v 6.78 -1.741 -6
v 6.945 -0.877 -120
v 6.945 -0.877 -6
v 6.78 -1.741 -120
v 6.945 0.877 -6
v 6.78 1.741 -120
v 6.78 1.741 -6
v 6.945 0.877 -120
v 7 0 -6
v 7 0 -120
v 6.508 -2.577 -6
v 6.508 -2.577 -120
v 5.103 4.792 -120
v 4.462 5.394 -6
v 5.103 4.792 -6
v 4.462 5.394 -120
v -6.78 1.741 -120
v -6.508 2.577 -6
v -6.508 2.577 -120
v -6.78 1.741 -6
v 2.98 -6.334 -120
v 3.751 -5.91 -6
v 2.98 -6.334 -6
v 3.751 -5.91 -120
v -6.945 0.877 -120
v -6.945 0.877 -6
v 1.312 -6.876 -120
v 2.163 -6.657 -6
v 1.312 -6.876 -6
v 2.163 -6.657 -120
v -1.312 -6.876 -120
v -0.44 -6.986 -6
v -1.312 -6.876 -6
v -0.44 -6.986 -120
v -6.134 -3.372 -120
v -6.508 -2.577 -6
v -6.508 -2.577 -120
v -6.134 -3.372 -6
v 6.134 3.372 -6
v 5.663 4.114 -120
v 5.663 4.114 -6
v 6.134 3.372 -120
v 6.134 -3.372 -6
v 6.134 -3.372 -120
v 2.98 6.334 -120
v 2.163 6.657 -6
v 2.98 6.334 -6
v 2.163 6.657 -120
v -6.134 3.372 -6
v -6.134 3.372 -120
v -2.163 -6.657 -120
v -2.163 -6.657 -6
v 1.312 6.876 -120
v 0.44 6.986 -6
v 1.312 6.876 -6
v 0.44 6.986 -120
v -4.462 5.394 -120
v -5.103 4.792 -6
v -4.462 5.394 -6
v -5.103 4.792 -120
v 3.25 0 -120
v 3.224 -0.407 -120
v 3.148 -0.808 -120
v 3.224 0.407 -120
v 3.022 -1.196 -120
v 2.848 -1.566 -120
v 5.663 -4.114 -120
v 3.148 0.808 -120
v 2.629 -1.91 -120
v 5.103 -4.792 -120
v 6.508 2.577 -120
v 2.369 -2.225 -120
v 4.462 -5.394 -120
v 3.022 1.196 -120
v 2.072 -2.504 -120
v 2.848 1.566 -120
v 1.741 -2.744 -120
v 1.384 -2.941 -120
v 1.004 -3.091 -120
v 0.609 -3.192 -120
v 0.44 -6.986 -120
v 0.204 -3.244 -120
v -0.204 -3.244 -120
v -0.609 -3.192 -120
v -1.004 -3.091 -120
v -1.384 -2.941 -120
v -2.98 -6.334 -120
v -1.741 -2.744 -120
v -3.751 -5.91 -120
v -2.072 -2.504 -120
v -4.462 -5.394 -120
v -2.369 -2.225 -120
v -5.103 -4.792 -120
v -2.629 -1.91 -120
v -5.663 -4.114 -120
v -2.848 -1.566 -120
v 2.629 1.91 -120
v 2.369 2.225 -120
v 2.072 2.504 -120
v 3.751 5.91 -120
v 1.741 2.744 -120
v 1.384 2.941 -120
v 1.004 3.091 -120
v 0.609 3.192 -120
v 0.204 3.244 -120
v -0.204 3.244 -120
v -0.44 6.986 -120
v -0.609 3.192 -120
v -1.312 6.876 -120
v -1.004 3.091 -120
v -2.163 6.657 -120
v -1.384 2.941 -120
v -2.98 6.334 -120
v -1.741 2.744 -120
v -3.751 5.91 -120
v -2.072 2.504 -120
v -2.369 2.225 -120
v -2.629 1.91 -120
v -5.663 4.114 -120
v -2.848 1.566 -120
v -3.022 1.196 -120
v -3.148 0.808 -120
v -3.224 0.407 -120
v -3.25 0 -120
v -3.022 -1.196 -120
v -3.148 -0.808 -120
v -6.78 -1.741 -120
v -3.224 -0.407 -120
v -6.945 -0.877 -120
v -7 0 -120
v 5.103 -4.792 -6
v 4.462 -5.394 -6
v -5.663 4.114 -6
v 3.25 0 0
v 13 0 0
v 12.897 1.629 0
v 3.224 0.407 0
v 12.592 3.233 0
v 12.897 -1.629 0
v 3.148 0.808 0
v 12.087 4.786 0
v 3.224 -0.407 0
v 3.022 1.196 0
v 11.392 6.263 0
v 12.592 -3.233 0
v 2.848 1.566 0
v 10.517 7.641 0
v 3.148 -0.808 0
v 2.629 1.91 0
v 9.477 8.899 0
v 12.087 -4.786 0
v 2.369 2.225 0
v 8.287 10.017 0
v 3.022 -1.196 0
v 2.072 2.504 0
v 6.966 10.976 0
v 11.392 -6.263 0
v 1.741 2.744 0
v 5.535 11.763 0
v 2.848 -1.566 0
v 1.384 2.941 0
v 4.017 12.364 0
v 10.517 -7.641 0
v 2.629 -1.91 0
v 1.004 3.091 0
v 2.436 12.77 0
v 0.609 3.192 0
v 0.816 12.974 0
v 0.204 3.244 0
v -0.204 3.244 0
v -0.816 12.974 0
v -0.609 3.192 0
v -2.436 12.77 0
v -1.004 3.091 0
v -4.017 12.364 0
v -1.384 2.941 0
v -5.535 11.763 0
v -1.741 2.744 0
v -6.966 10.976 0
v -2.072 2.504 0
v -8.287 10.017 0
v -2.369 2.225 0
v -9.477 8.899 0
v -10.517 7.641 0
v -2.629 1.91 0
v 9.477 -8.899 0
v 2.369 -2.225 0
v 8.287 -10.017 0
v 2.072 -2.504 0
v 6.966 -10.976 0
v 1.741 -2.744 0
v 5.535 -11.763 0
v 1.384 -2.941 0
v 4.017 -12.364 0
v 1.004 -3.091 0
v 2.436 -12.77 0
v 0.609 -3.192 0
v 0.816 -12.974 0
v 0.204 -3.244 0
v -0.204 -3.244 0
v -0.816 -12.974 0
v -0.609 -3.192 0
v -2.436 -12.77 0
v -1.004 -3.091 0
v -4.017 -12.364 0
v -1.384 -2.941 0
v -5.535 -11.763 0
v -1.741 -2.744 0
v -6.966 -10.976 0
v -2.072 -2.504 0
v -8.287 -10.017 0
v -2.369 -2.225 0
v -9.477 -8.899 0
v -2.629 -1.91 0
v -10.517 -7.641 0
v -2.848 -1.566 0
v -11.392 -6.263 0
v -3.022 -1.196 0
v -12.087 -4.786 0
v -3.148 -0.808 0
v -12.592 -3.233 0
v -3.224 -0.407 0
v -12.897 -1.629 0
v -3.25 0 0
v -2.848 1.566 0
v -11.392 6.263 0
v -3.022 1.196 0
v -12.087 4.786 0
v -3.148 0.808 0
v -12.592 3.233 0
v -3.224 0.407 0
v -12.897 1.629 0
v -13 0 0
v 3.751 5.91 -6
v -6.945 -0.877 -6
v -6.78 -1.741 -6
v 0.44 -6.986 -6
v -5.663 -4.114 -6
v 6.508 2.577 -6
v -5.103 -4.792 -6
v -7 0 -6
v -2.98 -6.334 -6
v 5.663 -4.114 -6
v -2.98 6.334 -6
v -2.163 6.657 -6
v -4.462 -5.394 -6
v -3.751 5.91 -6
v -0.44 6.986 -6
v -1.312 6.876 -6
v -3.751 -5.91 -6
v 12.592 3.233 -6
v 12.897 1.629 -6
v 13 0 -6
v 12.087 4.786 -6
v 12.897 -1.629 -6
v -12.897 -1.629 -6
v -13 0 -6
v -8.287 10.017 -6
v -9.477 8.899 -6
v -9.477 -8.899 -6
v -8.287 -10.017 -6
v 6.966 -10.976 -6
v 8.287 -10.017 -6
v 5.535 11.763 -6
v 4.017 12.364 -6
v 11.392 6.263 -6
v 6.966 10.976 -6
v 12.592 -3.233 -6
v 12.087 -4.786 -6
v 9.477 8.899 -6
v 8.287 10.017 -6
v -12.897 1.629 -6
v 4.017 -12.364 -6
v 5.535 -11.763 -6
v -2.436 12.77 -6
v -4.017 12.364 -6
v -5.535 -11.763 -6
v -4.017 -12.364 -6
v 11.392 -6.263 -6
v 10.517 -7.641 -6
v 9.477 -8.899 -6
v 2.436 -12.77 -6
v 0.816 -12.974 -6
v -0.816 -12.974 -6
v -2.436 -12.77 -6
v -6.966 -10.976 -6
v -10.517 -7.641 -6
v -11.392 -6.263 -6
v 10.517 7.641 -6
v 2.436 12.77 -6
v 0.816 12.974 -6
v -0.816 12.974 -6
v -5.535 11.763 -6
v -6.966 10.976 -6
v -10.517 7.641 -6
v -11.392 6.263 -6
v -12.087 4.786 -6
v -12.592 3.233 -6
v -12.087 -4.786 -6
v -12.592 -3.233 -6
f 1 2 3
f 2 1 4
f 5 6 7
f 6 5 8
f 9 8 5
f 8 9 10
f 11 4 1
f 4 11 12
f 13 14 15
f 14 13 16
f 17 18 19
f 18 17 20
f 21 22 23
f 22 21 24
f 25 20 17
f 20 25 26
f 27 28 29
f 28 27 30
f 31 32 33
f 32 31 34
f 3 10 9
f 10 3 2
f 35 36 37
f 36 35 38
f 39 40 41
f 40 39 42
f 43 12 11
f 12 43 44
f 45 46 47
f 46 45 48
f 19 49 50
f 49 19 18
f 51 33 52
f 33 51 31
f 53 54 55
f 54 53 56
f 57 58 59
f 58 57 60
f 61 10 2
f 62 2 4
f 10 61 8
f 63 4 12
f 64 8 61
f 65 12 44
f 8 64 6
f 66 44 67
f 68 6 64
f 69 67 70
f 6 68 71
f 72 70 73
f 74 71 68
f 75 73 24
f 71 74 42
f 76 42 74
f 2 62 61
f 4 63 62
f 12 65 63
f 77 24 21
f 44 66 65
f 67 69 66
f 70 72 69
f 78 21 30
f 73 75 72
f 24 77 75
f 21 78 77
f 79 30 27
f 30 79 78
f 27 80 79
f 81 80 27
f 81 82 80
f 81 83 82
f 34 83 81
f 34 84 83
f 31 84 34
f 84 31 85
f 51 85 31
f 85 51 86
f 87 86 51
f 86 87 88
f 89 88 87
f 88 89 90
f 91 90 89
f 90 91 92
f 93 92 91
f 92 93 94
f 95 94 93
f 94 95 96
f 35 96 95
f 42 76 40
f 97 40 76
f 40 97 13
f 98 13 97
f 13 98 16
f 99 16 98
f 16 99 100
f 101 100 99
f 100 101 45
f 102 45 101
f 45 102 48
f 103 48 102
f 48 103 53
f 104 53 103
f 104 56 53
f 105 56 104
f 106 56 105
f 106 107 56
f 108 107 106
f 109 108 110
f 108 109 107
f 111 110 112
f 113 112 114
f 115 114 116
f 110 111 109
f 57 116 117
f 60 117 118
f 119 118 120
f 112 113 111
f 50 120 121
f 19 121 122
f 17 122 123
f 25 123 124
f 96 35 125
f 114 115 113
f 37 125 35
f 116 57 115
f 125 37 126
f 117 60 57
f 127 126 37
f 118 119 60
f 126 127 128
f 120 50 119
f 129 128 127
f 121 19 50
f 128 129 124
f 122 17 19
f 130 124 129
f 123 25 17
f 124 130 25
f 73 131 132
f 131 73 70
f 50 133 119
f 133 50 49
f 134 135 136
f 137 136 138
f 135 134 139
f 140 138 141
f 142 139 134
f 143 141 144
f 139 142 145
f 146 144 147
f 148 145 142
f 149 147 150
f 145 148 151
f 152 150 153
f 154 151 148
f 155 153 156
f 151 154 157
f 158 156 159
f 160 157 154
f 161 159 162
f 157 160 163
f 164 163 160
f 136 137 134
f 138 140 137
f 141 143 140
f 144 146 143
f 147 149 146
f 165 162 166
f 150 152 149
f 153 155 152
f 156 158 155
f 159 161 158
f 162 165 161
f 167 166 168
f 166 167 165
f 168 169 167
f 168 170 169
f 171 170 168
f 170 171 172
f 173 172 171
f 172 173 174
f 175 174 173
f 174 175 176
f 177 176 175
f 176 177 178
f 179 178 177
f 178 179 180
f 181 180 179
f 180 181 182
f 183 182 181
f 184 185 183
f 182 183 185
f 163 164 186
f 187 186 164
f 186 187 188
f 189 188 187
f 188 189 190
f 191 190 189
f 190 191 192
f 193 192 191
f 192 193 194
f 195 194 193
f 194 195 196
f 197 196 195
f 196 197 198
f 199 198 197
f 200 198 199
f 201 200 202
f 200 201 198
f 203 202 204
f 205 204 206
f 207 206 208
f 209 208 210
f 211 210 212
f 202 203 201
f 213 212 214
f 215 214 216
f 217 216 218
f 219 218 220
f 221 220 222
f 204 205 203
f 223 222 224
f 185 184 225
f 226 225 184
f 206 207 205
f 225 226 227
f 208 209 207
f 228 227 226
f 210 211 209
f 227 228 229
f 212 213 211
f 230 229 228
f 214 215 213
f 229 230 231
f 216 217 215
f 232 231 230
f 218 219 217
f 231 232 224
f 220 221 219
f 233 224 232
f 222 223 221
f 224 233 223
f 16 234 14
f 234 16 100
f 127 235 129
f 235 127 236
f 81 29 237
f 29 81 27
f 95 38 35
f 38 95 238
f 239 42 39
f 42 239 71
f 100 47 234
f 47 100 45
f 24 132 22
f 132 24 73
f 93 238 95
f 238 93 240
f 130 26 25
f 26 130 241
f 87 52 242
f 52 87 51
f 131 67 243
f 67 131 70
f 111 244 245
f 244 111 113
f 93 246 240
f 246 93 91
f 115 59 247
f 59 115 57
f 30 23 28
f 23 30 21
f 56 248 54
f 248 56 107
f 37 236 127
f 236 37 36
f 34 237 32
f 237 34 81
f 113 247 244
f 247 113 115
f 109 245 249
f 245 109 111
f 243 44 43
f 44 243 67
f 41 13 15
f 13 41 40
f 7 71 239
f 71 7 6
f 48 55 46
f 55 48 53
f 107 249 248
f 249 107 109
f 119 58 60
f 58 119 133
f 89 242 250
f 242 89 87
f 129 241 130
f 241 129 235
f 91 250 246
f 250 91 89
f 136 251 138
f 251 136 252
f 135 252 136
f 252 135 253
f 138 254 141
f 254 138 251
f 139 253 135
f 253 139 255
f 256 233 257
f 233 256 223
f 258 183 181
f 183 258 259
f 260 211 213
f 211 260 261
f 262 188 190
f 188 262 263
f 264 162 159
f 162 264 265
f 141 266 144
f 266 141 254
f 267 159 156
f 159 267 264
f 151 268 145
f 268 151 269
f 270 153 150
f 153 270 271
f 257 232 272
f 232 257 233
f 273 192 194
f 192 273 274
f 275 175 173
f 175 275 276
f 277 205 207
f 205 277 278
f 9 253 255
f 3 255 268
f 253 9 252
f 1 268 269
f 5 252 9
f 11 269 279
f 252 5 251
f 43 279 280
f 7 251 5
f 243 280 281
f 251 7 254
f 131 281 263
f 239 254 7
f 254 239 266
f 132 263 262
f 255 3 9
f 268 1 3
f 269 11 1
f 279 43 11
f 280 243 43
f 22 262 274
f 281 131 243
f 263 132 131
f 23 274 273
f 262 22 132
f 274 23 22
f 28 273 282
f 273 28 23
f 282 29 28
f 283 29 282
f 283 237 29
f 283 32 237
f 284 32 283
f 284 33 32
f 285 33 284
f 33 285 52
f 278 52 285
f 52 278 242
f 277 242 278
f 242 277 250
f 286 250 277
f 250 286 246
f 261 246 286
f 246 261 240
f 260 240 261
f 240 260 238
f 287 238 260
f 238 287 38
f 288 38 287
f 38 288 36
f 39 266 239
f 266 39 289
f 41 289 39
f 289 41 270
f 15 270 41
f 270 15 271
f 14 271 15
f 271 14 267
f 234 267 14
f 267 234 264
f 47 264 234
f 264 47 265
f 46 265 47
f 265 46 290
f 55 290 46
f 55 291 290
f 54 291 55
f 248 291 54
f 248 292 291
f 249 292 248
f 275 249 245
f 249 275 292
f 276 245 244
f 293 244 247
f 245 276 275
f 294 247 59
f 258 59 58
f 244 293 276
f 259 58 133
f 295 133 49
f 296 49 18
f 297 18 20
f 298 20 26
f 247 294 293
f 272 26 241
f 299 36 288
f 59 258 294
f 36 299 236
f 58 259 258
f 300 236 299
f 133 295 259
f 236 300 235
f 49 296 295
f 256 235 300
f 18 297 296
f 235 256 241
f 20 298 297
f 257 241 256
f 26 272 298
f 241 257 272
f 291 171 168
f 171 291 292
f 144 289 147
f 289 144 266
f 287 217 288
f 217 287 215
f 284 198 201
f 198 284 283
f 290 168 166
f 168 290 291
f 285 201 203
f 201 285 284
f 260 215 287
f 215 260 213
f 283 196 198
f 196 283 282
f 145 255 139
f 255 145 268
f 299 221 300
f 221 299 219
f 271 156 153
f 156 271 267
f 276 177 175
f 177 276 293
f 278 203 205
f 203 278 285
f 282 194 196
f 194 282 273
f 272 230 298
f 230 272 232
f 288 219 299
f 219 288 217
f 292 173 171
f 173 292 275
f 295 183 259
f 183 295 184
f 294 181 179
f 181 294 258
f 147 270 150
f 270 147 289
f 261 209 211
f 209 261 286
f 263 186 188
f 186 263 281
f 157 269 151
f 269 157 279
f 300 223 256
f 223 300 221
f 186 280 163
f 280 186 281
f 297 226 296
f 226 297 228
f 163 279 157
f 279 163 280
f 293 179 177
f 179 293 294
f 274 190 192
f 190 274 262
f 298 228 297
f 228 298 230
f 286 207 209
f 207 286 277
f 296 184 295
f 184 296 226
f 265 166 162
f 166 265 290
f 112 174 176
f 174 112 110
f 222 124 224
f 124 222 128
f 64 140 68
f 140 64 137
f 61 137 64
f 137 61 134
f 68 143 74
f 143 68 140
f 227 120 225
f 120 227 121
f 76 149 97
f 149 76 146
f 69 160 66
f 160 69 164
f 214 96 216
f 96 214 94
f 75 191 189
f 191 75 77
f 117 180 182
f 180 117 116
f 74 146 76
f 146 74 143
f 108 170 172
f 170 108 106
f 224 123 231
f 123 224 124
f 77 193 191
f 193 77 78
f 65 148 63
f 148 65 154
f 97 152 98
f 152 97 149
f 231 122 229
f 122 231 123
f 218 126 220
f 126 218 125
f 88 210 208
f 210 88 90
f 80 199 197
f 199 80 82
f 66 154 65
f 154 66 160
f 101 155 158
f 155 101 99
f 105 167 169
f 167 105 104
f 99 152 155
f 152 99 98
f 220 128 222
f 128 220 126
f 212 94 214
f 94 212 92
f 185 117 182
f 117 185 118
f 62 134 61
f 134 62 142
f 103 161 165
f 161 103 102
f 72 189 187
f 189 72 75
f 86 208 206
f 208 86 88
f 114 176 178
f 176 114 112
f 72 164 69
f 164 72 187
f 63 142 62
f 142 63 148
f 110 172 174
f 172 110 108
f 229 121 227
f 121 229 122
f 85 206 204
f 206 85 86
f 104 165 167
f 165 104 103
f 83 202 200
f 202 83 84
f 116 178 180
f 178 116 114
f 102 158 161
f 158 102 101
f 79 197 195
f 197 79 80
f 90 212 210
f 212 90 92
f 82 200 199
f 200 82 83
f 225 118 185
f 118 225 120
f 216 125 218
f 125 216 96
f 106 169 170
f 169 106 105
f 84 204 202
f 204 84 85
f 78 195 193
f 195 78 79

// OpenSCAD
$fn = 50;


difference() {
	union() {
		translate(v = [0, 0, -120.0000000000]) {
			cylinder(h = 120, r = 7.0000000000);
		}
		translate(v = [0, 0, -6.0000000000]) {
			cylinder(h = 6, r = 13.0000000000);
		}
	}
	union() {
		#translate(v = [0, 0, -120]) {
			cylinder(h = 120, r = 3.2500000000);
		}
	}
}
